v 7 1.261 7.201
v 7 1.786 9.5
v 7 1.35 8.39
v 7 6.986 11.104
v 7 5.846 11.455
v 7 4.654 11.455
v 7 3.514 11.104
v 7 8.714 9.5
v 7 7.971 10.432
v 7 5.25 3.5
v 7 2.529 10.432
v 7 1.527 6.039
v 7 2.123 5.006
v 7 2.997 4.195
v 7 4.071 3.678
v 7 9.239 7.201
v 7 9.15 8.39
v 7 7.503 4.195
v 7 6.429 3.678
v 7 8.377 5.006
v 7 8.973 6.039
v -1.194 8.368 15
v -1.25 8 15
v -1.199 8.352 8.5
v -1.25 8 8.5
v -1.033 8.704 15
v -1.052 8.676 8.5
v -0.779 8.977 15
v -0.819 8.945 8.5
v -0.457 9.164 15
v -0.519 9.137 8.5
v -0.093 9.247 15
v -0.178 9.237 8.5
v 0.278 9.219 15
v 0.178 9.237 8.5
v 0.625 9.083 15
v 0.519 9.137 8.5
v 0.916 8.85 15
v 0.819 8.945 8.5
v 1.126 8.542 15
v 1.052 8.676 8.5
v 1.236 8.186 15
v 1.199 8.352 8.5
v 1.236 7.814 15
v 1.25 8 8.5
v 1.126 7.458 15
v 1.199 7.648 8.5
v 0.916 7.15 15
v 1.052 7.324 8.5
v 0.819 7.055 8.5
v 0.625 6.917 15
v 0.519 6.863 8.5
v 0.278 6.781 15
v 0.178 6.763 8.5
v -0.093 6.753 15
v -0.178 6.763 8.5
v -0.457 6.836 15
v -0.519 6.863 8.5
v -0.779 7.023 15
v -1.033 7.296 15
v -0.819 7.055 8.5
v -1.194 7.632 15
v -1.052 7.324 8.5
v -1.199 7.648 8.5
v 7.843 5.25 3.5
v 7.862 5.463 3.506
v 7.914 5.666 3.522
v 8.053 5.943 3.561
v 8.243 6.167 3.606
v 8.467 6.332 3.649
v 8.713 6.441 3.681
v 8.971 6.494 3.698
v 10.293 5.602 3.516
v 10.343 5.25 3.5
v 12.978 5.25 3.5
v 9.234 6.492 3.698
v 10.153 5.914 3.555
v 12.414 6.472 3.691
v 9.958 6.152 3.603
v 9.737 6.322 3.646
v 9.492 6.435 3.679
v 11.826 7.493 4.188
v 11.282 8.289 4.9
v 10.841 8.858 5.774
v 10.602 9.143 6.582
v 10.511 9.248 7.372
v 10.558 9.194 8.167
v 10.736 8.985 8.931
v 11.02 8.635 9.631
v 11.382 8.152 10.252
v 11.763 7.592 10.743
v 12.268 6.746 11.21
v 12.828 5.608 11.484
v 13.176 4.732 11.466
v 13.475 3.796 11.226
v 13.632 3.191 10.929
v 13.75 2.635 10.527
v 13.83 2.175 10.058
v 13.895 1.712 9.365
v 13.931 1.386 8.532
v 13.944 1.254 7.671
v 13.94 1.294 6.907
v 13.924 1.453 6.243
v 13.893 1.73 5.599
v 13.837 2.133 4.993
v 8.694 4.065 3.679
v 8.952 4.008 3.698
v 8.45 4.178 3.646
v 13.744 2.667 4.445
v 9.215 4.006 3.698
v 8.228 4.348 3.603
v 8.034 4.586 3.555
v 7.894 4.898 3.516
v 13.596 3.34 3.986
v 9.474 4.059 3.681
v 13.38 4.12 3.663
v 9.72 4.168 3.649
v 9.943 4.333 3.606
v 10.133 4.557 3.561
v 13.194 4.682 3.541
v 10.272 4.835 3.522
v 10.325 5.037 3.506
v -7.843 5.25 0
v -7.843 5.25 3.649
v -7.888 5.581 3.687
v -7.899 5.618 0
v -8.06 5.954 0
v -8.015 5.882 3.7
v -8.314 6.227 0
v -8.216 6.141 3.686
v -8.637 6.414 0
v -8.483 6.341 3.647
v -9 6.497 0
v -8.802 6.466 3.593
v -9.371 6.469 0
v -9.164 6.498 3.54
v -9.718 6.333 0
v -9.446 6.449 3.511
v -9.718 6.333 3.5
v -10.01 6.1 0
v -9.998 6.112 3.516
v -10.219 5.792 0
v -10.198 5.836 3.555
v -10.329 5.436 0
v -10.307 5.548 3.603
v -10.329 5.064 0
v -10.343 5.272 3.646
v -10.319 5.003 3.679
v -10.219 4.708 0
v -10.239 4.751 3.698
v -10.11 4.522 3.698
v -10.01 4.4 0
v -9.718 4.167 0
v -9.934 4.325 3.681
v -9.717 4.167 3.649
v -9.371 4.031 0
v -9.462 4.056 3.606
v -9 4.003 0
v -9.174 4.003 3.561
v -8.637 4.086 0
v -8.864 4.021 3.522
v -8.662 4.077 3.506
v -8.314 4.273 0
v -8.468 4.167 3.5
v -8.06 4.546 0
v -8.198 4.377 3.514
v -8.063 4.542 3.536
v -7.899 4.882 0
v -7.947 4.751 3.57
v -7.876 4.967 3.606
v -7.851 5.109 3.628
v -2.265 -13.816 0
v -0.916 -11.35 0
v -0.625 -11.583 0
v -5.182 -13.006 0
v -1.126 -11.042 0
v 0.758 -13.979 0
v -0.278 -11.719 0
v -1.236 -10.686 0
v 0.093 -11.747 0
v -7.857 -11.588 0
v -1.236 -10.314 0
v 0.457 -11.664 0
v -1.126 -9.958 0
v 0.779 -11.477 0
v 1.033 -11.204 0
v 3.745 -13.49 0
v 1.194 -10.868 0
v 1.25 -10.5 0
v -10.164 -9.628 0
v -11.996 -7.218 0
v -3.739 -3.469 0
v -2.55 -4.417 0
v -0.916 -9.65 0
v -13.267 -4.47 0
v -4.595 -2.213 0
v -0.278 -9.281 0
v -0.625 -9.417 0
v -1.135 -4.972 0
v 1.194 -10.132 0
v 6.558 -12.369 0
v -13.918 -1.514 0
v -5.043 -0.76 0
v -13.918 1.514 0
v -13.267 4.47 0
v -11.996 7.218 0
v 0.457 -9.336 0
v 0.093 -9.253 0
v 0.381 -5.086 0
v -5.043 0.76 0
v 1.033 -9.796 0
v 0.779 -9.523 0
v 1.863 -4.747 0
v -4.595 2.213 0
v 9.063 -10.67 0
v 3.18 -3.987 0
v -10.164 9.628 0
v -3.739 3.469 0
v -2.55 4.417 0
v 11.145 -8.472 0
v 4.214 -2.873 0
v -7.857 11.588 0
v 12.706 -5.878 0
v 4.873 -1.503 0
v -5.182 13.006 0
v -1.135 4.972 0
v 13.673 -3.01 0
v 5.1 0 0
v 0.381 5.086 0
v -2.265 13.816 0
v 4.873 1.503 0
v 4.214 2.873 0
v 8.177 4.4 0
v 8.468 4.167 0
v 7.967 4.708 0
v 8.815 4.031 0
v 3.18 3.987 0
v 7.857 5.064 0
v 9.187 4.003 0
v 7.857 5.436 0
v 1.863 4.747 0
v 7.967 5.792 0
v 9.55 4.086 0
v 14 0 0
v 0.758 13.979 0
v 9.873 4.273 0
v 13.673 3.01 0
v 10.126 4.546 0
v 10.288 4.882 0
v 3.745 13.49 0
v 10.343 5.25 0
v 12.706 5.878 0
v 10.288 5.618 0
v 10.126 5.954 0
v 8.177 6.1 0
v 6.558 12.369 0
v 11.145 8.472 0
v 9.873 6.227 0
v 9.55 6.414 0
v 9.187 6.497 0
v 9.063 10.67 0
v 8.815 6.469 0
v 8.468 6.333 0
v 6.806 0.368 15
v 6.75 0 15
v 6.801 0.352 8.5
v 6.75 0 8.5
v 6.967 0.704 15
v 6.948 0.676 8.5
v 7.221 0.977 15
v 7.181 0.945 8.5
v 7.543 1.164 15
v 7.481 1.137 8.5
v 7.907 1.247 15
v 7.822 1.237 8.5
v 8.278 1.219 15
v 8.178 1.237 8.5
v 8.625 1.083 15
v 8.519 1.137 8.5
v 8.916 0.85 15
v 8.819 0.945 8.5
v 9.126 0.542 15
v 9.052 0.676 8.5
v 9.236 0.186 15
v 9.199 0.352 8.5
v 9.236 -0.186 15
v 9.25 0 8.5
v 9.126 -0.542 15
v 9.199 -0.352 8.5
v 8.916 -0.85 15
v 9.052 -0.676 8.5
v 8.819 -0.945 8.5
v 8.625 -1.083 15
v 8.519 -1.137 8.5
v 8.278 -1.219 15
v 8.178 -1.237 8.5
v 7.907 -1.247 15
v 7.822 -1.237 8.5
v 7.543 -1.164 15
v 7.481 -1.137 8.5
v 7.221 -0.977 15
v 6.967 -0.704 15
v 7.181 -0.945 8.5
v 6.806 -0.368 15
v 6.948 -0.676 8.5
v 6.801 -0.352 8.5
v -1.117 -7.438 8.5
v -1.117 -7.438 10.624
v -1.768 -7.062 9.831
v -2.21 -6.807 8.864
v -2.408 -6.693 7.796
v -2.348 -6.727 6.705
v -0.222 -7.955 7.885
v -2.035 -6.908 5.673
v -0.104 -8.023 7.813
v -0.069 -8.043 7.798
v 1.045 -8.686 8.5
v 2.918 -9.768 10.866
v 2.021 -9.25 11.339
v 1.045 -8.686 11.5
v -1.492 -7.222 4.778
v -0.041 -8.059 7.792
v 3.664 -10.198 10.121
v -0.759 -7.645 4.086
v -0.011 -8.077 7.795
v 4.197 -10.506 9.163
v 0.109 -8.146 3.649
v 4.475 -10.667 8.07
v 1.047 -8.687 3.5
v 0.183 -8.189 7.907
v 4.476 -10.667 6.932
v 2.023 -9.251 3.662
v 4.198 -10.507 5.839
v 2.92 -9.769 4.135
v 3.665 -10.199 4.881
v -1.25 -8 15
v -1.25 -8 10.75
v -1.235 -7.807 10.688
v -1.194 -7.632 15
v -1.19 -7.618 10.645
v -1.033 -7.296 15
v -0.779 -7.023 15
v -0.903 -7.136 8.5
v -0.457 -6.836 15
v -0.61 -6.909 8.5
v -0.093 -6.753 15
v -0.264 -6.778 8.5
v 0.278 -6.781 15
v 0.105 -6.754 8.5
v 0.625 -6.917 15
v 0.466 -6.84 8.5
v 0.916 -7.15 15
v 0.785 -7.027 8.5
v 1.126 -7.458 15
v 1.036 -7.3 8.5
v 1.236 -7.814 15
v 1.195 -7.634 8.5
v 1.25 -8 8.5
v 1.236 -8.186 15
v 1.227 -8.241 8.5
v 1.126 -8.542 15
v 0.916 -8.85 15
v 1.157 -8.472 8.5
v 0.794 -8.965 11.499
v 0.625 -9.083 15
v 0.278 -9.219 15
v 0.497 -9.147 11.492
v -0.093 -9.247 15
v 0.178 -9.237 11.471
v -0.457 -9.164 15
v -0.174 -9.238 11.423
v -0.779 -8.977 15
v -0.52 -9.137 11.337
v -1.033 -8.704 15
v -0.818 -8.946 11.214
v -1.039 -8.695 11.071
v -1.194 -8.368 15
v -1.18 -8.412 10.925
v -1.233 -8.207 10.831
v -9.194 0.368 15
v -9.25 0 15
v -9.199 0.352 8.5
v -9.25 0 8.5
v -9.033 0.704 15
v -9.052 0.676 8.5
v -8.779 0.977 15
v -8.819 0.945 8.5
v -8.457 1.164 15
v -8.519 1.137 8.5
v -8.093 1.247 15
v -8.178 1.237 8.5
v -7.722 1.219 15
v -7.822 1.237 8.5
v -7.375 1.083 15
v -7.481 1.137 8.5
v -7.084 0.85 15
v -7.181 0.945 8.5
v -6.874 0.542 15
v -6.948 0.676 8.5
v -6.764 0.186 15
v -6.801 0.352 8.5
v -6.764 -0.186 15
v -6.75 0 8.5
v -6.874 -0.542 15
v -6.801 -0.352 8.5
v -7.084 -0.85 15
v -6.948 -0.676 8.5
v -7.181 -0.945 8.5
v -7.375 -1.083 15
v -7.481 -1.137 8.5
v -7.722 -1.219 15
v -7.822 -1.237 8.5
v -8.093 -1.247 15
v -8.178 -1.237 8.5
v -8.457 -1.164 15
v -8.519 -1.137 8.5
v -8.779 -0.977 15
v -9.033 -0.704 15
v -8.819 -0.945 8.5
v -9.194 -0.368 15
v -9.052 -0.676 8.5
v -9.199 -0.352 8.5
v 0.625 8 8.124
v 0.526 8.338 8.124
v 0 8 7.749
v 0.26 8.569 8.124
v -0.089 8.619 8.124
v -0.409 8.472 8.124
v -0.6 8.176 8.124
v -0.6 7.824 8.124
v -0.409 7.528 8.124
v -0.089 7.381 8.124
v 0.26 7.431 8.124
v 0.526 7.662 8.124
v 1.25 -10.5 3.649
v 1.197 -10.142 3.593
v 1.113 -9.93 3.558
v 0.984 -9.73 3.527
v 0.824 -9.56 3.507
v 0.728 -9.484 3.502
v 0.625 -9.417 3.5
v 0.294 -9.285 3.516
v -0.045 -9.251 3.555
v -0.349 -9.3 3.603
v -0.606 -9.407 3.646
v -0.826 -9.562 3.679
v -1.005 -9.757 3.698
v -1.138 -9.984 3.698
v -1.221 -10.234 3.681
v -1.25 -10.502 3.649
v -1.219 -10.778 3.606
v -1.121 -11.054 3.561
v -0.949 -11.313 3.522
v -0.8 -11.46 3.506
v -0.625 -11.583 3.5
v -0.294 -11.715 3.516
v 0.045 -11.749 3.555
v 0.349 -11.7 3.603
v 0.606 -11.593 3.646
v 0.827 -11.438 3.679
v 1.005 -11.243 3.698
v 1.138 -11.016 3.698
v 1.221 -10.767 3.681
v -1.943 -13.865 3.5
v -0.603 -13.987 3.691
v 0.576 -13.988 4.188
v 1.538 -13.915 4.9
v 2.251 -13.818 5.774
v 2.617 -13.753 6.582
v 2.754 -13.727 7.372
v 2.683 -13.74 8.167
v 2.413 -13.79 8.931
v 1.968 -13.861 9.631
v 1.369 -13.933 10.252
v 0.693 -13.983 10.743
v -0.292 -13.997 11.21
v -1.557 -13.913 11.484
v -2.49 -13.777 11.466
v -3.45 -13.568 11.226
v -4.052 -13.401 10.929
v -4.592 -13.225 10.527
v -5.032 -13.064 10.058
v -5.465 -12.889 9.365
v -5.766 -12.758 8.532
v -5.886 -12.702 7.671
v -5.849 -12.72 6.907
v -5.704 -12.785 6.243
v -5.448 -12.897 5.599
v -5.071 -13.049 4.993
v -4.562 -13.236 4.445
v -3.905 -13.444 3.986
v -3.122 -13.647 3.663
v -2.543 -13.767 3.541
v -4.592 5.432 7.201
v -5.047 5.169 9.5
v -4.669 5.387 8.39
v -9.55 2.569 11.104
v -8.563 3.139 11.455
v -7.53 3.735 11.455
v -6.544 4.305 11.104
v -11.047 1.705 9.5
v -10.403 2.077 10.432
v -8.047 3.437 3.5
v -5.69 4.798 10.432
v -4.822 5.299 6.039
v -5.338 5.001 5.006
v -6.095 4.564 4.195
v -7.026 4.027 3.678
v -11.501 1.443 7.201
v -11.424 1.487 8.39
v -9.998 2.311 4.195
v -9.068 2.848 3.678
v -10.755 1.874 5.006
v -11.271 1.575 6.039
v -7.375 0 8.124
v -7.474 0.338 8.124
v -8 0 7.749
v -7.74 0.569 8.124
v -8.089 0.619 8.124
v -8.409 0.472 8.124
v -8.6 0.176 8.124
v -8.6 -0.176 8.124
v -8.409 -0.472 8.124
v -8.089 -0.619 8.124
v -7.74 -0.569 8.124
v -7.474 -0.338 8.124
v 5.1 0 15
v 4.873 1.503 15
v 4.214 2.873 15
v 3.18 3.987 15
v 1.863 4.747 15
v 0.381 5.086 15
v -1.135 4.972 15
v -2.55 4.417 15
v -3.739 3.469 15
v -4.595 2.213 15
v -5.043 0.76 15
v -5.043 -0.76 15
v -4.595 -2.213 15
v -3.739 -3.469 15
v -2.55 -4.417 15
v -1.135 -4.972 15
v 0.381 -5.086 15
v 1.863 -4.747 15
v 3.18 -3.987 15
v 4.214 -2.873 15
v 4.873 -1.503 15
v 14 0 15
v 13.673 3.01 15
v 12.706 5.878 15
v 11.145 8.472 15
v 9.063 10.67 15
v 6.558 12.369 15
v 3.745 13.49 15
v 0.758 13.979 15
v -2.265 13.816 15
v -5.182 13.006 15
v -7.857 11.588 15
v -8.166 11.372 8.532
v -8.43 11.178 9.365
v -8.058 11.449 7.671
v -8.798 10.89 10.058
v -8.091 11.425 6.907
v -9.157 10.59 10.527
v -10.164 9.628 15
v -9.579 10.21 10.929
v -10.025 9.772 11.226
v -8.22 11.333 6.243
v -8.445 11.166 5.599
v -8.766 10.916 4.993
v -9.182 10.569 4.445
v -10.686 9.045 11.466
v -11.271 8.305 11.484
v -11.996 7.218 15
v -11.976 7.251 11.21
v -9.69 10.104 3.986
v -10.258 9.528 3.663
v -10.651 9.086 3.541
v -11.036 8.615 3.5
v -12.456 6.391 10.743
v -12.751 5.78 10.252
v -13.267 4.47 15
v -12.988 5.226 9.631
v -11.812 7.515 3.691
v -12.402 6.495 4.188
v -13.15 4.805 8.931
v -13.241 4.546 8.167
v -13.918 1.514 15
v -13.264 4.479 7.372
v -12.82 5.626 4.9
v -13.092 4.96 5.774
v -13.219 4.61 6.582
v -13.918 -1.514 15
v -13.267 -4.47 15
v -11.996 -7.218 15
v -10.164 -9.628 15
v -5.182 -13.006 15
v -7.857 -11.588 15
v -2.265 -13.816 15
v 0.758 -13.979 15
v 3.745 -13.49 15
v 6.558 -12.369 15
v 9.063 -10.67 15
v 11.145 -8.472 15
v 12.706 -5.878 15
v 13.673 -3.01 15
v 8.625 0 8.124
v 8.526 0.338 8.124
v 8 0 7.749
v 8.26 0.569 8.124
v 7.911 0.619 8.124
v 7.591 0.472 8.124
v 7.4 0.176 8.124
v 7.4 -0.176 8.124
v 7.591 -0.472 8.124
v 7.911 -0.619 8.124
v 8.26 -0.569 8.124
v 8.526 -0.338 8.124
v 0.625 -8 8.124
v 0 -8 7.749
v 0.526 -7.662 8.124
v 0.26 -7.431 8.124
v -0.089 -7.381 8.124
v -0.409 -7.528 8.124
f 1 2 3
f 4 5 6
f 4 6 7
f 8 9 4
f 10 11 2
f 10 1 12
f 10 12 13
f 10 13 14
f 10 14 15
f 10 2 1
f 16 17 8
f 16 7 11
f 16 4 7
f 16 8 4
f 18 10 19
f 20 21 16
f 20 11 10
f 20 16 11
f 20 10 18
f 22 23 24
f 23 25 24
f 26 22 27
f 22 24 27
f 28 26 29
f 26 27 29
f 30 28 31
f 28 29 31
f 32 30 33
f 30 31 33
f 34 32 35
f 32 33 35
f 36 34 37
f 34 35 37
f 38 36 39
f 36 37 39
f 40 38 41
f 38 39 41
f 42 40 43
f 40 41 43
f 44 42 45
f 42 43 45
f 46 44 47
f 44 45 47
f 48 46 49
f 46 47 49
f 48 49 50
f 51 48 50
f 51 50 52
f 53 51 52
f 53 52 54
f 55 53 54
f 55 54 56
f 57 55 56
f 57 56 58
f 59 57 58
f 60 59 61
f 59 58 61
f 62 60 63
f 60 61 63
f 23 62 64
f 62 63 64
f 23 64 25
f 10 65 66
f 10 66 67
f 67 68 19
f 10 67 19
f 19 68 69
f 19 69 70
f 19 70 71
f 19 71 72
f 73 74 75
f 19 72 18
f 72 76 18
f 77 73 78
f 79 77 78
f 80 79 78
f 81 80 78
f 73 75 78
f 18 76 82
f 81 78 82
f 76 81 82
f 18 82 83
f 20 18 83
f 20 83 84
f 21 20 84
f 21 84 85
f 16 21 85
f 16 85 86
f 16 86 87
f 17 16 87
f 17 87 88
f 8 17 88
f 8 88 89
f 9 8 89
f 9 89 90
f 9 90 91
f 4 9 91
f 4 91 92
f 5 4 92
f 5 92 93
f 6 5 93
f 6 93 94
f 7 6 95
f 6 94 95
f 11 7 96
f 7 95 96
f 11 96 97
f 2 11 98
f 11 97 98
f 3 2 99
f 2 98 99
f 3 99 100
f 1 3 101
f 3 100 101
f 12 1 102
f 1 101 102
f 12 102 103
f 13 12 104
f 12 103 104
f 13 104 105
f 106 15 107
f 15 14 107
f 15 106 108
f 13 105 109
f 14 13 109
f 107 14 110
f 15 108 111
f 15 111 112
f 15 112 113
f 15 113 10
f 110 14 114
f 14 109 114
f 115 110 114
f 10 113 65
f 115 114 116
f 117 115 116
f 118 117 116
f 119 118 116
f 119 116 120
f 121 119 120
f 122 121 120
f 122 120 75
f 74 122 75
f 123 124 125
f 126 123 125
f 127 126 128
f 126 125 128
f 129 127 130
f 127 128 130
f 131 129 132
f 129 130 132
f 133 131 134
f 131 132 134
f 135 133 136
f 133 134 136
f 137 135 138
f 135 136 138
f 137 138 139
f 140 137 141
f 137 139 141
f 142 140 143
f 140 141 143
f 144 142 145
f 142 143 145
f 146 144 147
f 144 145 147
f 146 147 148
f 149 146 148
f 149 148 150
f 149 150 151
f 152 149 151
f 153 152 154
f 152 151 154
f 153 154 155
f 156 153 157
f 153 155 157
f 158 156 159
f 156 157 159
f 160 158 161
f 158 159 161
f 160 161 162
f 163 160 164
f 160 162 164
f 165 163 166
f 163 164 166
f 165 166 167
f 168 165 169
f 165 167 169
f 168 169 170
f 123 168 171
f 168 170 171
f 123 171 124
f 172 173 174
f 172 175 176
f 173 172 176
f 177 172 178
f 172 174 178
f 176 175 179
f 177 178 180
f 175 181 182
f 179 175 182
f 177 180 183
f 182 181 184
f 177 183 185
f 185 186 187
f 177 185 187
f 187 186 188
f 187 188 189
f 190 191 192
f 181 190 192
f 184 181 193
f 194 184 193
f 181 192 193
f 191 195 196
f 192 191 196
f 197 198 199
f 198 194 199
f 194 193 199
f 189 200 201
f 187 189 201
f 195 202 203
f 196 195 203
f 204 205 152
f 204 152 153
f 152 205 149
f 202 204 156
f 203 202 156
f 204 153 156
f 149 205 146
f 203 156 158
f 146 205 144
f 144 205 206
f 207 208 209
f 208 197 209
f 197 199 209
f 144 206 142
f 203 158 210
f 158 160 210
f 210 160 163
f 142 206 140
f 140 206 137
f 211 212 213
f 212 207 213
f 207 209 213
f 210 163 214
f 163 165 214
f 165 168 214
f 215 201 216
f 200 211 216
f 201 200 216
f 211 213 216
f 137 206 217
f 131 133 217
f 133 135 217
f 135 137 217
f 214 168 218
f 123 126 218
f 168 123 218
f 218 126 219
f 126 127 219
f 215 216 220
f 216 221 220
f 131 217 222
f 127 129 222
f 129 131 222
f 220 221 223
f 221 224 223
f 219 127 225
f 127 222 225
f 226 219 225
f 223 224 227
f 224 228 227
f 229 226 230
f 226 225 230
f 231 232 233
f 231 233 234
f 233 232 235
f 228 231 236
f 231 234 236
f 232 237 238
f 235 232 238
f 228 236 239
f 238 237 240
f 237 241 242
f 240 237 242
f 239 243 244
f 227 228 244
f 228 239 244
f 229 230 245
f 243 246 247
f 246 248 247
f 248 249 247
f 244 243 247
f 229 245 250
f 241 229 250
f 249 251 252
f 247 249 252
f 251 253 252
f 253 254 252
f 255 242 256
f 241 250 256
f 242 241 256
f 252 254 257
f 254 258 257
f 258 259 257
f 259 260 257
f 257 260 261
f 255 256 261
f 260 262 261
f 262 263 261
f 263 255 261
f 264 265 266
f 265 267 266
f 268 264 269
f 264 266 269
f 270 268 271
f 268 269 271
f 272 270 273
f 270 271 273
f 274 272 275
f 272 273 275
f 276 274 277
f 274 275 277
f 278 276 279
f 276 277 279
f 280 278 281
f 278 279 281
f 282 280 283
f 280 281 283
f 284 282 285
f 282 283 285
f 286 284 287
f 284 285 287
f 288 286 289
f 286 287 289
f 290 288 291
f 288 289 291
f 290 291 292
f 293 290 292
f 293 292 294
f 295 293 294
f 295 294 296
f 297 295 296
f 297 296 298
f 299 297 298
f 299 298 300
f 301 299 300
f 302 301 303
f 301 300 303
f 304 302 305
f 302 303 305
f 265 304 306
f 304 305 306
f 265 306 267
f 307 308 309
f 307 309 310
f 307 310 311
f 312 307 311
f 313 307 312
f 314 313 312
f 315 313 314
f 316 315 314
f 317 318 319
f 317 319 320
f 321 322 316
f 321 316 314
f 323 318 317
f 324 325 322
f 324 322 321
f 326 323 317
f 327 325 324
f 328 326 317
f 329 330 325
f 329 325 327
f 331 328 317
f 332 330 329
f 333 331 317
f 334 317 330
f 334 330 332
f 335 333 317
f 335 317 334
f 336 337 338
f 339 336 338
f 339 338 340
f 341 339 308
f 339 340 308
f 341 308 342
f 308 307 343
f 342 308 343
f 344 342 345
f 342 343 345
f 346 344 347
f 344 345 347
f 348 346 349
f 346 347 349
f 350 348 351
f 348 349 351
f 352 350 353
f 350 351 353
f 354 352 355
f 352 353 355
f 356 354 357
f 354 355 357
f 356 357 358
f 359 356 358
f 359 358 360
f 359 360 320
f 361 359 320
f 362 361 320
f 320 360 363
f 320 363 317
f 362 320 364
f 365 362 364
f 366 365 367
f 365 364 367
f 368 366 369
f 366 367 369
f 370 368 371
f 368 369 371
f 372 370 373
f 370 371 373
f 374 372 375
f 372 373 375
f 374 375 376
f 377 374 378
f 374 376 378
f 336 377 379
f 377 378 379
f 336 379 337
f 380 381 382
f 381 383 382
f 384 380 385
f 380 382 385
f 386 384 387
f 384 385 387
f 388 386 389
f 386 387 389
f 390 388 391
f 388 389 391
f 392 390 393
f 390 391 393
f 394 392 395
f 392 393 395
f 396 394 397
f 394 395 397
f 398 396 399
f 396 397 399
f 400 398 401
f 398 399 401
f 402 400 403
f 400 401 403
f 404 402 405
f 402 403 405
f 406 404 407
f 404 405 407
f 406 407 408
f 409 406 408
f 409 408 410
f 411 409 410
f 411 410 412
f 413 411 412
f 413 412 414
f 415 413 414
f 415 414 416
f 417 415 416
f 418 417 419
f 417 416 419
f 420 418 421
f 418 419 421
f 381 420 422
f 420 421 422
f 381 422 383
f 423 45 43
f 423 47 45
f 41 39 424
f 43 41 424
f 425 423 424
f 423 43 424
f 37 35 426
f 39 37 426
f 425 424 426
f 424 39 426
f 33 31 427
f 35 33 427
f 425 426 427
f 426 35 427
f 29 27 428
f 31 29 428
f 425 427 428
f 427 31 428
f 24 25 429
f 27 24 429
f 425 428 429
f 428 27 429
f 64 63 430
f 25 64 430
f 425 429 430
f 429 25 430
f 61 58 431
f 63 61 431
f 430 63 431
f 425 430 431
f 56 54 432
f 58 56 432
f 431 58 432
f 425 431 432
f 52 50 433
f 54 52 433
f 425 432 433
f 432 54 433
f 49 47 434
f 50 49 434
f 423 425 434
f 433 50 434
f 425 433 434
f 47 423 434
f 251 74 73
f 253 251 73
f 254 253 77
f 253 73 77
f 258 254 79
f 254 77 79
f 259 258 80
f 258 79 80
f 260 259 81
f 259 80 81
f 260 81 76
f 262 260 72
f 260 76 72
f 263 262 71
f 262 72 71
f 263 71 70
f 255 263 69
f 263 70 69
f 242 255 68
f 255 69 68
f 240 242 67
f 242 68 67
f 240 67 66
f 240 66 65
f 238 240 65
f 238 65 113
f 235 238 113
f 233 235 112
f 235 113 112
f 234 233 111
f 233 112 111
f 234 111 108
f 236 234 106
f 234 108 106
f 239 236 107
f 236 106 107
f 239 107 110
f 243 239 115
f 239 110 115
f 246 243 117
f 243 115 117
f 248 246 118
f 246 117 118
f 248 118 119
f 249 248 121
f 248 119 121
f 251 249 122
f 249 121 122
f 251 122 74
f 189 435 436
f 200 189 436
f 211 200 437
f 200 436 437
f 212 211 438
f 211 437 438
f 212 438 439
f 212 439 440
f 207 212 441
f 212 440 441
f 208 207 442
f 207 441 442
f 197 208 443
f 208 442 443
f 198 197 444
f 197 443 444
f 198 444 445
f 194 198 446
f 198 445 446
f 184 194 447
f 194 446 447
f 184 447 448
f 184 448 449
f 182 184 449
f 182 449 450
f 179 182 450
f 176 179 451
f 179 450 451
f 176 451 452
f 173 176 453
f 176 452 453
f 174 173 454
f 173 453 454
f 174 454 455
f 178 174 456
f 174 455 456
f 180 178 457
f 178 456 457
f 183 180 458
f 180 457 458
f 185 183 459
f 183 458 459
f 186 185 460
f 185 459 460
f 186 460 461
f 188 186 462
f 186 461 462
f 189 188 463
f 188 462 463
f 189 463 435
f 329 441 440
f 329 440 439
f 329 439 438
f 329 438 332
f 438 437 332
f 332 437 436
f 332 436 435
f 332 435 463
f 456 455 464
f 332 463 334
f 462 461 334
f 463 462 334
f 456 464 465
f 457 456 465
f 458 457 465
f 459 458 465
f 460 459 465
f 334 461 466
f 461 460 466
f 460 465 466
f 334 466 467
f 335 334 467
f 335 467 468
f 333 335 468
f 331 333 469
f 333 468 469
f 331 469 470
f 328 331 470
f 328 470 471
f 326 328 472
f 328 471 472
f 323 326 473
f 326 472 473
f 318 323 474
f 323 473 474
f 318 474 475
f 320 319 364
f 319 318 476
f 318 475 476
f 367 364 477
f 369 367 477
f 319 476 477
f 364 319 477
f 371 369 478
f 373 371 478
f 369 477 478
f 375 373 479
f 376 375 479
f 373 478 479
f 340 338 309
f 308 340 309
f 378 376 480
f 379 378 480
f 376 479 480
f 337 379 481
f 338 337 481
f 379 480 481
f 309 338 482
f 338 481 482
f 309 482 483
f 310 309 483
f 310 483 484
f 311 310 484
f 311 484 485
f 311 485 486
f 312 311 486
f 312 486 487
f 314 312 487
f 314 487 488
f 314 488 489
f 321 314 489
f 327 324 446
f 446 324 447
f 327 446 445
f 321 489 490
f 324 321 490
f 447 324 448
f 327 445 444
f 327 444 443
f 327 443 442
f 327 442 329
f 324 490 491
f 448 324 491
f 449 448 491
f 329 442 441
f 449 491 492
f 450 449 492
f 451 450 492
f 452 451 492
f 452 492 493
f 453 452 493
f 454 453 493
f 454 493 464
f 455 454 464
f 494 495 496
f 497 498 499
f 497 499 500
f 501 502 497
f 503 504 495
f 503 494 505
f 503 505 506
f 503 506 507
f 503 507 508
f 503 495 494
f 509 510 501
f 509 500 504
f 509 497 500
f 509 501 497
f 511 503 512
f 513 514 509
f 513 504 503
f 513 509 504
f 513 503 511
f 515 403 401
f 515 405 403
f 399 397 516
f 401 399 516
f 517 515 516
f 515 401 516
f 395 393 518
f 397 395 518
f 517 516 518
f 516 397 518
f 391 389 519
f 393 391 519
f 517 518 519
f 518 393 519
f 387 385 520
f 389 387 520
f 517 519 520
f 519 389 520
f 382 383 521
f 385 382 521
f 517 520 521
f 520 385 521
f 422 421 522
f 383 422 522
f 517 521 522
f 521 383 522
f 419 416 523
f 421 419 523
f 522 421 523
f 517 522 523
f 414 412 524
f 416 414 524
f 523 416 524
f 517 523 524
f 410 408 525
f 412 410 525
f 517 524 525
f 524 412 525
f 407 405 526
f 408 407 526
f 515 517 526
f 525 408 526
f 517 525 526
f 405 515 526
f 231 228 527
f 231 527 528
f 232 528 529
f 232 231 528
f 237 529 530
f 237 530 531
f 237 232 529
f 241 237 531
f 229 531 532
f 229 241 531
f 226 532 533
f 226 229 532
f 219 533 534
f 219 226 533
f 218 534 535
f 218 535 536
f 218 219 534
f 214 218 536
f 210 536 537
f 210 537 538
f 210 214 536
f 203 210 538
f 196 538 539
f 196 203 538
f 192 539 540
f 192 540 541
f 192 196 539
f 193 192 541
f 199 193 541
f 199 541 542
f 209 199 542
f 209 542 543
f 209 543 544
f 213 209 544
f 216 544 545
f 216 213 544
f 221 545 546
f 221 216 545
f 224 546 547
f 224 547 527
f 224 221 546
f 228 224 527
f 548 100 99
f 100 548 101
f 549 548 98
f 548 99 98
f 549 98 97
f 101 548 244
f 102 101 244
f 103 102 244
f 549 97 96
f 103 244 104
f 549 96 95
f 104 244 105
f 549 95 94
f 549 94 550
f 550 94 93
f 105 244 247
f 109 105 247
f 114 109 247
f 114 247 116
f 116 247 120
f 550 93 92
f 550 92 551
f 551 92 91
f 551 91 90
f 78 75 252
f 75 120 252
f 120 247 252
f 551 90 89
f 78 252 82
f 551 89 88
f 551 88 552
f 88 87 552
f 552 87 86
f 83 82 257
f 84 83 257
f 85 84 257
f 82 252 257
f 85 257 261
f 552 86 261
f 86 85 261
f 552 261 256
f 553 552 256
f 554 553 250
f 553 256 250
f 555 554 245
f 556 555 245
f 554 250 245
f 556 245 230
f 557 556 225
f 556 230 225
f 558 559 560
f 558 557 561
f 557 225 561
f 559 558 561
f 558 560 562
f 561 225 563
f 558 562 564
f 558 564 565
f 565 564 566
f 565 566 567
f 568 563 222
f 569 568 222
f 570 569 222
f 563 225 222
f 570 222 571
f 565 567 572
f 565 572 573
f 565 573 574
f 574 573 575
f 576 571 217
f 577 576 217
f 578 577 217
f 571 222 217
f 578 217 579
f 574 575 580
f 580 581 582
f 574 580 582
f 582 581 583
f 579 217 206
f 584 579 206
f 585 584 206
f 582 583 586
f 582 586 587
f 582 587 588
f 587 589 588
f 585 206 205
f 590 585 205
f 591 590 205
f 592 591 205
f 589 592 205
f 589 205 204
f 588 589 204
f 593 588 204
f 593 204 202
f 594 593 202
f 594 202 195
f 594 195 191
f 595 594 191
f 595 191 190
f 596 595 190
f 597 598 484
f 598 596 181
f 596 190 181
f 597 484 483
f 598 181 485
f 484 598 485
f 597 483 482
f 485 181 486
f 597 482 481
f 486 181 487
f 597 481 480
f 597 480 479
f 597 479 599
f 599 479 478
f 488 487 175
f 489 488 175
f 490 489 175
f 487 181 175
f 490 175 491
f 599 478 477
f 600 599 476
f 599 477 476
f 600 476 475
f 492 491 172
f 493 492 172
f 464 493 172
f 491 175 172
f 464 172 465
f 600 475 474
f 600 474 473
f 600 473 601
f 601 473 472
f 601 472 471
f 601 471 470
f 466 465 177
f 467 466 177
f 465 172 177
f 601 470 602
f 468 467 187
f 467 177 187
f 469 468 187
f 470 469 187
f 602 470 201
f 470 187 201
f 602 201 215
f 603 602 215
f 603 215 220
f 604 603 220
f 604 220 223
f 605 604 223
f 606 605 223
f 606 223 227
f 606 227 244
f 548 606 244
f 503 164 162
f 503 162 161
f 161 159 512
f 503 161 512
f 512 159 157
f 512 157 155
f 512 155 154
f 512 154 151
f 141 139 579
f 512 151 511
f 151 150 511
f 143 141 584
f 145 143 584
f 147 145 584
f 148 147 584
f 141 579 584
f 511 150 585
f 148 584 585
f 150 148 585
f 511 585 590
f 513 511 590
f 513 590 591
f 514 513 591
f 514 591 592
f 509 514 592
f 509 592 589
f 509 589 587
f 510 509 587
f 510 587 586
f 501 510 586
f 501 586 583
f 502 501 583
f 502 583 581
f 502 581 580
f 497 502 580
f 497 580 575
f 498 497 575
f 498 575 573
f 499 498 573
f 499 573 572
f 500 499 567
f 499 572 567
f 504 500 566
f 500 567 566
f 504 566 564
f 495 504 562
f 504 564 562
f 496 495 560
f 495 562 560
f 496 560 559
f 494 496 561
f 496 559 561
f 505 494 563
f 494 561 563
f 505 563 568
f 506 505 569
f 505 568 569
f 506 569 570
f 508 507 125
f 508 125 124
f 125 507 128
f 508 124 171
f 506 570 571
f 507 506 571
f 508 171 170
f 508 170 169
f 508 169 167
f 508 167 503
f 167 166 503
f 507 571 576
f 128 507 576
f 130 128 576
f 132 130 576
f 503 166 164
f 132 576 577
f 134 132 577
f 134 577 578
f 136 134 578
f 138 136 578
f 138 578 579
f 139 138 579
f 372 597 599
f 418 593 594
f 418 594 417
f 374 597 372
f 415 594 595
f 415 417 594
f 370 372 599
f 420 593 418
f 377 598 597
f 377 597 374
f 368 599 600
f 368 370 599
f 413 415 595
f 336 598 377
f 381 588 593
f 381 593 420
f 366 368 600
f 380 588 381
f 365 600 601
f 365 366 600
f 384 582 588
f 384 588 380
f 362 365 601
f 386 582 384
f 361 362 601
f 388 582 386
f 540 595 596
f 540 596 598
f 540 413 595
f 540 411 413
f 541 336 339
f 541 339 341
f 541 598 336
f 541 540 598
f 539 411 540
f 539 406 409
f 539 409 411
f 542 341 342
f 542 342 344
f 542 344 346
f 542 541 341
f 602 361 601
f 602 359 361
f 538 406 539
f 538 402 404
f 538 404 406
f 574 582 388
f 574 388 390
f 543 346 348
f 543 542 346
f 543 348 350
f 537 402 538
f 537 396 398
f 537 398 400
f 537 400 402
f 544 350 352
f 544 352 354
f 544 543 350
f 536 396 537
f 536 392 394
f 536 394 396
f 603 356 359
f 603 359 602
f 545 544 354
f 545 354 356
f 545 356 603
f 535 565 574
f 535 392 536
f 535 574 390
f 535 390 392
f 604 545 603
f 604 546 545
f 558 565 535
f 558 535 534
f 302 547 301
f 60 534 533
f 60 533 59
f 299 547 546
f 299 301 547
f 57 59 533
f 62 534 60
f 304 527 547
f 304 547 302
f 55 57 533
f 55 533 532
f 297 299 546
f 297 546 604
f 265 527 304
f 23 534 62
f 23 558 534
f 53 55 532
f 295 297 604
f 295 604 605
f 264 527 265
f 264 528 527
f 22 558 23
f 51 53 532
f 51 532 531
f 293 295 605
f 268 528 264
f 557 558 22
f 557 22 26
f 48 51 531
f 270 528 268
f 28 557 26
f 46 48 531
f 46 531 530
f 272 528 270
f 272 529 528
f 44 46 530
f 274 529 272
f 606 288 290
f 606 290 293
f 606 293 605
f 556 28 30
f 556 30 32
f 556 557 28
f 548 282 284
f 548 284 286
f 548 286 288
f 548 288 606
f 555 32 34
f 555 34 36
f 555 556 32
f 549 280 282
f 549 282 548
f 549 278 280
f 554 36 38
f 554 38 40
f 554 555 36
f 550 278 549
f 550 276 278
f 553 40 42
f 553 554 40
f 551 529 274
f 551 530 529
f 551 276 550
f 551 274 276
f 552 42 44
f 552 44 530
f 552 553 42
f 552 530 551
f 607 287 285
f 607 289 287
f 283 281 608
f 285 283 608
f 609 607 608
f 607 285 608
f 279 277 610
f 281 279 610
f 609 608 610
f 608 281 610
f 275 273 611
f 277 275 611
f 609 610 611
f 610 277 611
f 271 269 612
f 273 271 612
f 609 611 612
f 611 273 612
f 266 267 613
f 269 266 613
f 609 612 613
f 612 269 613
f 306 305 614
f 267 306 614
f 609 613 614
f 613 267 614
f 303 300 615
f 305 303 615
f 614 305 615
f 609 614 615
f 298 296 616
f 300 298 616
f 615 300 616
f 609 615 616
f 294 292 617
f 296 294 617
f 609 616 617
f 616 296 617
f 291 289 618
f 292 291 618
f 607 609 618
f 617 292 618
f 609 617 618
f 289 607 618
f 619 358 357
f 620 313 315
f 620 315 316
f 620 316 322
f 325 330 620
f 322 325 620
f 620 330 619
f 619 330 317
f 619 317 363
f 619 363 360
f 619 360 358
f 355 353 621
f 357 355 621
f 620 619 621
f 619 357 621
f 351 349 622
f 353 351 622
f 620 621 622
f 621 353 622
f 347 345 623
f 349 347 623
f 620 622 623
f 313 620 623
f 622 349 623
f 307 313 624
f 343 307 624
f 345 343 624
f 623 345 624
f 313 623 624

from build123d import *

# Parameters (mm, degrees)
SKETCH1_R             = 14
SKETCH1_R_2           = 5.1
BOSS_EXTRUDE1_DEPTH   = 15
M3_TAPPED_HOLE1_D     = 2.5
M3_TAPPED_HOLE1_DEPTH = 6.5
M3_TAPPED_HOLE1_TIP   = 0.751075774
M3_TAPPED_HOLE2_D     = 2.5
M3_TAPPED_HOLE2_DEPTH = 6.5
M3_TAPPED_HOLE2_TIP   = 0.751075774
SKETCH19_R            = 4
CUT_EXTRUDE3_DEPTH    = 7
CIRPATTERN2_COUNT     = 3


with BuildPart() as part:
    # Sketch1 → Boss-Extrude1 (new body)
    with BuildSketch(Plane.XY):
        Circle(SKETCH1_R)
        Circle(SKETCH1_R_2, mode=Mode.SUBTRACT)
    extrude(amount=BOSS_EXTRUDE1_DEPTH)

    # M3 Tapped Hole1
    with Locations(Plane.XY.offset(15)):
        with Locations((0, -8), (-8, 0), (0, 8), (8, 0)):
            Hole(M3_TAPPED_HOLE1_D / 2, depth=M3_TAPPED_HOLE1_DEPTH)
            with Locations((0, 0, -(M3_TAPPED_HOLE1_DEPTH + M3_TAPPED_HOLE1_TIP / 2))):  # 118° drill point
                Cone(0, M3_TAPPED_HOLE1_D / 2, M3_TAPPED_HOLE1_TIP, mode=Mode.SUBTRACT)

    # M3 Tapped Hole2
    with Locations(Plane(origin=(0, 0, 0), x_dir=(-1, 0, 0), z_dir=(0, 0, -1))):
        with Locations((0, -10.5), (-9.09326674, 5.25), (9.09326674, 5.25)):
            Hole(M3_TAPPED_HOLE2_D / 2, depth=M3_TAPPED_HOLE2_DEPTH)
            with Locations((0, 0, -(M3_TAPPED_HOLE2_DEPTH + M3_TAPPED_HOLE2_TIP / 2))):  # 118° drill point
                Cone(0, M3_TAPPED_HOLE2_D / 2, M3_TAPPED_HOLE2_TIP, mode=Mode.SUBTRACT)

    # Sketch19 → Cut-Extrude3 (cut)
    with BuildSketch(Plane(origin=(14, 0, 0), x_dir=(0, 0, -1), z_dir=(1, 0, 0))):
        with Locations((-7.5, 5.25)):
            Circle(SKETCH19_R)
    cut_extrude3 = extrude(amount=-CUT_EXTRUDE3_DEPTH, mode=Mode.SUBTRACT)

    # CirPattern2: Cut-Extrude3 ×3 about axis
    cirpattern2_axis = Axis((0, 0, 0), (0, 0, 1))
    for i in range(1, CIRPATTERN2_COUNT):
        add(cut_extrude3.rotate(cirpattern2_axis, i * 360 / CIRPATTERN2_COUNT), mode=Mode.SUBTRACT)


solid = part.part
